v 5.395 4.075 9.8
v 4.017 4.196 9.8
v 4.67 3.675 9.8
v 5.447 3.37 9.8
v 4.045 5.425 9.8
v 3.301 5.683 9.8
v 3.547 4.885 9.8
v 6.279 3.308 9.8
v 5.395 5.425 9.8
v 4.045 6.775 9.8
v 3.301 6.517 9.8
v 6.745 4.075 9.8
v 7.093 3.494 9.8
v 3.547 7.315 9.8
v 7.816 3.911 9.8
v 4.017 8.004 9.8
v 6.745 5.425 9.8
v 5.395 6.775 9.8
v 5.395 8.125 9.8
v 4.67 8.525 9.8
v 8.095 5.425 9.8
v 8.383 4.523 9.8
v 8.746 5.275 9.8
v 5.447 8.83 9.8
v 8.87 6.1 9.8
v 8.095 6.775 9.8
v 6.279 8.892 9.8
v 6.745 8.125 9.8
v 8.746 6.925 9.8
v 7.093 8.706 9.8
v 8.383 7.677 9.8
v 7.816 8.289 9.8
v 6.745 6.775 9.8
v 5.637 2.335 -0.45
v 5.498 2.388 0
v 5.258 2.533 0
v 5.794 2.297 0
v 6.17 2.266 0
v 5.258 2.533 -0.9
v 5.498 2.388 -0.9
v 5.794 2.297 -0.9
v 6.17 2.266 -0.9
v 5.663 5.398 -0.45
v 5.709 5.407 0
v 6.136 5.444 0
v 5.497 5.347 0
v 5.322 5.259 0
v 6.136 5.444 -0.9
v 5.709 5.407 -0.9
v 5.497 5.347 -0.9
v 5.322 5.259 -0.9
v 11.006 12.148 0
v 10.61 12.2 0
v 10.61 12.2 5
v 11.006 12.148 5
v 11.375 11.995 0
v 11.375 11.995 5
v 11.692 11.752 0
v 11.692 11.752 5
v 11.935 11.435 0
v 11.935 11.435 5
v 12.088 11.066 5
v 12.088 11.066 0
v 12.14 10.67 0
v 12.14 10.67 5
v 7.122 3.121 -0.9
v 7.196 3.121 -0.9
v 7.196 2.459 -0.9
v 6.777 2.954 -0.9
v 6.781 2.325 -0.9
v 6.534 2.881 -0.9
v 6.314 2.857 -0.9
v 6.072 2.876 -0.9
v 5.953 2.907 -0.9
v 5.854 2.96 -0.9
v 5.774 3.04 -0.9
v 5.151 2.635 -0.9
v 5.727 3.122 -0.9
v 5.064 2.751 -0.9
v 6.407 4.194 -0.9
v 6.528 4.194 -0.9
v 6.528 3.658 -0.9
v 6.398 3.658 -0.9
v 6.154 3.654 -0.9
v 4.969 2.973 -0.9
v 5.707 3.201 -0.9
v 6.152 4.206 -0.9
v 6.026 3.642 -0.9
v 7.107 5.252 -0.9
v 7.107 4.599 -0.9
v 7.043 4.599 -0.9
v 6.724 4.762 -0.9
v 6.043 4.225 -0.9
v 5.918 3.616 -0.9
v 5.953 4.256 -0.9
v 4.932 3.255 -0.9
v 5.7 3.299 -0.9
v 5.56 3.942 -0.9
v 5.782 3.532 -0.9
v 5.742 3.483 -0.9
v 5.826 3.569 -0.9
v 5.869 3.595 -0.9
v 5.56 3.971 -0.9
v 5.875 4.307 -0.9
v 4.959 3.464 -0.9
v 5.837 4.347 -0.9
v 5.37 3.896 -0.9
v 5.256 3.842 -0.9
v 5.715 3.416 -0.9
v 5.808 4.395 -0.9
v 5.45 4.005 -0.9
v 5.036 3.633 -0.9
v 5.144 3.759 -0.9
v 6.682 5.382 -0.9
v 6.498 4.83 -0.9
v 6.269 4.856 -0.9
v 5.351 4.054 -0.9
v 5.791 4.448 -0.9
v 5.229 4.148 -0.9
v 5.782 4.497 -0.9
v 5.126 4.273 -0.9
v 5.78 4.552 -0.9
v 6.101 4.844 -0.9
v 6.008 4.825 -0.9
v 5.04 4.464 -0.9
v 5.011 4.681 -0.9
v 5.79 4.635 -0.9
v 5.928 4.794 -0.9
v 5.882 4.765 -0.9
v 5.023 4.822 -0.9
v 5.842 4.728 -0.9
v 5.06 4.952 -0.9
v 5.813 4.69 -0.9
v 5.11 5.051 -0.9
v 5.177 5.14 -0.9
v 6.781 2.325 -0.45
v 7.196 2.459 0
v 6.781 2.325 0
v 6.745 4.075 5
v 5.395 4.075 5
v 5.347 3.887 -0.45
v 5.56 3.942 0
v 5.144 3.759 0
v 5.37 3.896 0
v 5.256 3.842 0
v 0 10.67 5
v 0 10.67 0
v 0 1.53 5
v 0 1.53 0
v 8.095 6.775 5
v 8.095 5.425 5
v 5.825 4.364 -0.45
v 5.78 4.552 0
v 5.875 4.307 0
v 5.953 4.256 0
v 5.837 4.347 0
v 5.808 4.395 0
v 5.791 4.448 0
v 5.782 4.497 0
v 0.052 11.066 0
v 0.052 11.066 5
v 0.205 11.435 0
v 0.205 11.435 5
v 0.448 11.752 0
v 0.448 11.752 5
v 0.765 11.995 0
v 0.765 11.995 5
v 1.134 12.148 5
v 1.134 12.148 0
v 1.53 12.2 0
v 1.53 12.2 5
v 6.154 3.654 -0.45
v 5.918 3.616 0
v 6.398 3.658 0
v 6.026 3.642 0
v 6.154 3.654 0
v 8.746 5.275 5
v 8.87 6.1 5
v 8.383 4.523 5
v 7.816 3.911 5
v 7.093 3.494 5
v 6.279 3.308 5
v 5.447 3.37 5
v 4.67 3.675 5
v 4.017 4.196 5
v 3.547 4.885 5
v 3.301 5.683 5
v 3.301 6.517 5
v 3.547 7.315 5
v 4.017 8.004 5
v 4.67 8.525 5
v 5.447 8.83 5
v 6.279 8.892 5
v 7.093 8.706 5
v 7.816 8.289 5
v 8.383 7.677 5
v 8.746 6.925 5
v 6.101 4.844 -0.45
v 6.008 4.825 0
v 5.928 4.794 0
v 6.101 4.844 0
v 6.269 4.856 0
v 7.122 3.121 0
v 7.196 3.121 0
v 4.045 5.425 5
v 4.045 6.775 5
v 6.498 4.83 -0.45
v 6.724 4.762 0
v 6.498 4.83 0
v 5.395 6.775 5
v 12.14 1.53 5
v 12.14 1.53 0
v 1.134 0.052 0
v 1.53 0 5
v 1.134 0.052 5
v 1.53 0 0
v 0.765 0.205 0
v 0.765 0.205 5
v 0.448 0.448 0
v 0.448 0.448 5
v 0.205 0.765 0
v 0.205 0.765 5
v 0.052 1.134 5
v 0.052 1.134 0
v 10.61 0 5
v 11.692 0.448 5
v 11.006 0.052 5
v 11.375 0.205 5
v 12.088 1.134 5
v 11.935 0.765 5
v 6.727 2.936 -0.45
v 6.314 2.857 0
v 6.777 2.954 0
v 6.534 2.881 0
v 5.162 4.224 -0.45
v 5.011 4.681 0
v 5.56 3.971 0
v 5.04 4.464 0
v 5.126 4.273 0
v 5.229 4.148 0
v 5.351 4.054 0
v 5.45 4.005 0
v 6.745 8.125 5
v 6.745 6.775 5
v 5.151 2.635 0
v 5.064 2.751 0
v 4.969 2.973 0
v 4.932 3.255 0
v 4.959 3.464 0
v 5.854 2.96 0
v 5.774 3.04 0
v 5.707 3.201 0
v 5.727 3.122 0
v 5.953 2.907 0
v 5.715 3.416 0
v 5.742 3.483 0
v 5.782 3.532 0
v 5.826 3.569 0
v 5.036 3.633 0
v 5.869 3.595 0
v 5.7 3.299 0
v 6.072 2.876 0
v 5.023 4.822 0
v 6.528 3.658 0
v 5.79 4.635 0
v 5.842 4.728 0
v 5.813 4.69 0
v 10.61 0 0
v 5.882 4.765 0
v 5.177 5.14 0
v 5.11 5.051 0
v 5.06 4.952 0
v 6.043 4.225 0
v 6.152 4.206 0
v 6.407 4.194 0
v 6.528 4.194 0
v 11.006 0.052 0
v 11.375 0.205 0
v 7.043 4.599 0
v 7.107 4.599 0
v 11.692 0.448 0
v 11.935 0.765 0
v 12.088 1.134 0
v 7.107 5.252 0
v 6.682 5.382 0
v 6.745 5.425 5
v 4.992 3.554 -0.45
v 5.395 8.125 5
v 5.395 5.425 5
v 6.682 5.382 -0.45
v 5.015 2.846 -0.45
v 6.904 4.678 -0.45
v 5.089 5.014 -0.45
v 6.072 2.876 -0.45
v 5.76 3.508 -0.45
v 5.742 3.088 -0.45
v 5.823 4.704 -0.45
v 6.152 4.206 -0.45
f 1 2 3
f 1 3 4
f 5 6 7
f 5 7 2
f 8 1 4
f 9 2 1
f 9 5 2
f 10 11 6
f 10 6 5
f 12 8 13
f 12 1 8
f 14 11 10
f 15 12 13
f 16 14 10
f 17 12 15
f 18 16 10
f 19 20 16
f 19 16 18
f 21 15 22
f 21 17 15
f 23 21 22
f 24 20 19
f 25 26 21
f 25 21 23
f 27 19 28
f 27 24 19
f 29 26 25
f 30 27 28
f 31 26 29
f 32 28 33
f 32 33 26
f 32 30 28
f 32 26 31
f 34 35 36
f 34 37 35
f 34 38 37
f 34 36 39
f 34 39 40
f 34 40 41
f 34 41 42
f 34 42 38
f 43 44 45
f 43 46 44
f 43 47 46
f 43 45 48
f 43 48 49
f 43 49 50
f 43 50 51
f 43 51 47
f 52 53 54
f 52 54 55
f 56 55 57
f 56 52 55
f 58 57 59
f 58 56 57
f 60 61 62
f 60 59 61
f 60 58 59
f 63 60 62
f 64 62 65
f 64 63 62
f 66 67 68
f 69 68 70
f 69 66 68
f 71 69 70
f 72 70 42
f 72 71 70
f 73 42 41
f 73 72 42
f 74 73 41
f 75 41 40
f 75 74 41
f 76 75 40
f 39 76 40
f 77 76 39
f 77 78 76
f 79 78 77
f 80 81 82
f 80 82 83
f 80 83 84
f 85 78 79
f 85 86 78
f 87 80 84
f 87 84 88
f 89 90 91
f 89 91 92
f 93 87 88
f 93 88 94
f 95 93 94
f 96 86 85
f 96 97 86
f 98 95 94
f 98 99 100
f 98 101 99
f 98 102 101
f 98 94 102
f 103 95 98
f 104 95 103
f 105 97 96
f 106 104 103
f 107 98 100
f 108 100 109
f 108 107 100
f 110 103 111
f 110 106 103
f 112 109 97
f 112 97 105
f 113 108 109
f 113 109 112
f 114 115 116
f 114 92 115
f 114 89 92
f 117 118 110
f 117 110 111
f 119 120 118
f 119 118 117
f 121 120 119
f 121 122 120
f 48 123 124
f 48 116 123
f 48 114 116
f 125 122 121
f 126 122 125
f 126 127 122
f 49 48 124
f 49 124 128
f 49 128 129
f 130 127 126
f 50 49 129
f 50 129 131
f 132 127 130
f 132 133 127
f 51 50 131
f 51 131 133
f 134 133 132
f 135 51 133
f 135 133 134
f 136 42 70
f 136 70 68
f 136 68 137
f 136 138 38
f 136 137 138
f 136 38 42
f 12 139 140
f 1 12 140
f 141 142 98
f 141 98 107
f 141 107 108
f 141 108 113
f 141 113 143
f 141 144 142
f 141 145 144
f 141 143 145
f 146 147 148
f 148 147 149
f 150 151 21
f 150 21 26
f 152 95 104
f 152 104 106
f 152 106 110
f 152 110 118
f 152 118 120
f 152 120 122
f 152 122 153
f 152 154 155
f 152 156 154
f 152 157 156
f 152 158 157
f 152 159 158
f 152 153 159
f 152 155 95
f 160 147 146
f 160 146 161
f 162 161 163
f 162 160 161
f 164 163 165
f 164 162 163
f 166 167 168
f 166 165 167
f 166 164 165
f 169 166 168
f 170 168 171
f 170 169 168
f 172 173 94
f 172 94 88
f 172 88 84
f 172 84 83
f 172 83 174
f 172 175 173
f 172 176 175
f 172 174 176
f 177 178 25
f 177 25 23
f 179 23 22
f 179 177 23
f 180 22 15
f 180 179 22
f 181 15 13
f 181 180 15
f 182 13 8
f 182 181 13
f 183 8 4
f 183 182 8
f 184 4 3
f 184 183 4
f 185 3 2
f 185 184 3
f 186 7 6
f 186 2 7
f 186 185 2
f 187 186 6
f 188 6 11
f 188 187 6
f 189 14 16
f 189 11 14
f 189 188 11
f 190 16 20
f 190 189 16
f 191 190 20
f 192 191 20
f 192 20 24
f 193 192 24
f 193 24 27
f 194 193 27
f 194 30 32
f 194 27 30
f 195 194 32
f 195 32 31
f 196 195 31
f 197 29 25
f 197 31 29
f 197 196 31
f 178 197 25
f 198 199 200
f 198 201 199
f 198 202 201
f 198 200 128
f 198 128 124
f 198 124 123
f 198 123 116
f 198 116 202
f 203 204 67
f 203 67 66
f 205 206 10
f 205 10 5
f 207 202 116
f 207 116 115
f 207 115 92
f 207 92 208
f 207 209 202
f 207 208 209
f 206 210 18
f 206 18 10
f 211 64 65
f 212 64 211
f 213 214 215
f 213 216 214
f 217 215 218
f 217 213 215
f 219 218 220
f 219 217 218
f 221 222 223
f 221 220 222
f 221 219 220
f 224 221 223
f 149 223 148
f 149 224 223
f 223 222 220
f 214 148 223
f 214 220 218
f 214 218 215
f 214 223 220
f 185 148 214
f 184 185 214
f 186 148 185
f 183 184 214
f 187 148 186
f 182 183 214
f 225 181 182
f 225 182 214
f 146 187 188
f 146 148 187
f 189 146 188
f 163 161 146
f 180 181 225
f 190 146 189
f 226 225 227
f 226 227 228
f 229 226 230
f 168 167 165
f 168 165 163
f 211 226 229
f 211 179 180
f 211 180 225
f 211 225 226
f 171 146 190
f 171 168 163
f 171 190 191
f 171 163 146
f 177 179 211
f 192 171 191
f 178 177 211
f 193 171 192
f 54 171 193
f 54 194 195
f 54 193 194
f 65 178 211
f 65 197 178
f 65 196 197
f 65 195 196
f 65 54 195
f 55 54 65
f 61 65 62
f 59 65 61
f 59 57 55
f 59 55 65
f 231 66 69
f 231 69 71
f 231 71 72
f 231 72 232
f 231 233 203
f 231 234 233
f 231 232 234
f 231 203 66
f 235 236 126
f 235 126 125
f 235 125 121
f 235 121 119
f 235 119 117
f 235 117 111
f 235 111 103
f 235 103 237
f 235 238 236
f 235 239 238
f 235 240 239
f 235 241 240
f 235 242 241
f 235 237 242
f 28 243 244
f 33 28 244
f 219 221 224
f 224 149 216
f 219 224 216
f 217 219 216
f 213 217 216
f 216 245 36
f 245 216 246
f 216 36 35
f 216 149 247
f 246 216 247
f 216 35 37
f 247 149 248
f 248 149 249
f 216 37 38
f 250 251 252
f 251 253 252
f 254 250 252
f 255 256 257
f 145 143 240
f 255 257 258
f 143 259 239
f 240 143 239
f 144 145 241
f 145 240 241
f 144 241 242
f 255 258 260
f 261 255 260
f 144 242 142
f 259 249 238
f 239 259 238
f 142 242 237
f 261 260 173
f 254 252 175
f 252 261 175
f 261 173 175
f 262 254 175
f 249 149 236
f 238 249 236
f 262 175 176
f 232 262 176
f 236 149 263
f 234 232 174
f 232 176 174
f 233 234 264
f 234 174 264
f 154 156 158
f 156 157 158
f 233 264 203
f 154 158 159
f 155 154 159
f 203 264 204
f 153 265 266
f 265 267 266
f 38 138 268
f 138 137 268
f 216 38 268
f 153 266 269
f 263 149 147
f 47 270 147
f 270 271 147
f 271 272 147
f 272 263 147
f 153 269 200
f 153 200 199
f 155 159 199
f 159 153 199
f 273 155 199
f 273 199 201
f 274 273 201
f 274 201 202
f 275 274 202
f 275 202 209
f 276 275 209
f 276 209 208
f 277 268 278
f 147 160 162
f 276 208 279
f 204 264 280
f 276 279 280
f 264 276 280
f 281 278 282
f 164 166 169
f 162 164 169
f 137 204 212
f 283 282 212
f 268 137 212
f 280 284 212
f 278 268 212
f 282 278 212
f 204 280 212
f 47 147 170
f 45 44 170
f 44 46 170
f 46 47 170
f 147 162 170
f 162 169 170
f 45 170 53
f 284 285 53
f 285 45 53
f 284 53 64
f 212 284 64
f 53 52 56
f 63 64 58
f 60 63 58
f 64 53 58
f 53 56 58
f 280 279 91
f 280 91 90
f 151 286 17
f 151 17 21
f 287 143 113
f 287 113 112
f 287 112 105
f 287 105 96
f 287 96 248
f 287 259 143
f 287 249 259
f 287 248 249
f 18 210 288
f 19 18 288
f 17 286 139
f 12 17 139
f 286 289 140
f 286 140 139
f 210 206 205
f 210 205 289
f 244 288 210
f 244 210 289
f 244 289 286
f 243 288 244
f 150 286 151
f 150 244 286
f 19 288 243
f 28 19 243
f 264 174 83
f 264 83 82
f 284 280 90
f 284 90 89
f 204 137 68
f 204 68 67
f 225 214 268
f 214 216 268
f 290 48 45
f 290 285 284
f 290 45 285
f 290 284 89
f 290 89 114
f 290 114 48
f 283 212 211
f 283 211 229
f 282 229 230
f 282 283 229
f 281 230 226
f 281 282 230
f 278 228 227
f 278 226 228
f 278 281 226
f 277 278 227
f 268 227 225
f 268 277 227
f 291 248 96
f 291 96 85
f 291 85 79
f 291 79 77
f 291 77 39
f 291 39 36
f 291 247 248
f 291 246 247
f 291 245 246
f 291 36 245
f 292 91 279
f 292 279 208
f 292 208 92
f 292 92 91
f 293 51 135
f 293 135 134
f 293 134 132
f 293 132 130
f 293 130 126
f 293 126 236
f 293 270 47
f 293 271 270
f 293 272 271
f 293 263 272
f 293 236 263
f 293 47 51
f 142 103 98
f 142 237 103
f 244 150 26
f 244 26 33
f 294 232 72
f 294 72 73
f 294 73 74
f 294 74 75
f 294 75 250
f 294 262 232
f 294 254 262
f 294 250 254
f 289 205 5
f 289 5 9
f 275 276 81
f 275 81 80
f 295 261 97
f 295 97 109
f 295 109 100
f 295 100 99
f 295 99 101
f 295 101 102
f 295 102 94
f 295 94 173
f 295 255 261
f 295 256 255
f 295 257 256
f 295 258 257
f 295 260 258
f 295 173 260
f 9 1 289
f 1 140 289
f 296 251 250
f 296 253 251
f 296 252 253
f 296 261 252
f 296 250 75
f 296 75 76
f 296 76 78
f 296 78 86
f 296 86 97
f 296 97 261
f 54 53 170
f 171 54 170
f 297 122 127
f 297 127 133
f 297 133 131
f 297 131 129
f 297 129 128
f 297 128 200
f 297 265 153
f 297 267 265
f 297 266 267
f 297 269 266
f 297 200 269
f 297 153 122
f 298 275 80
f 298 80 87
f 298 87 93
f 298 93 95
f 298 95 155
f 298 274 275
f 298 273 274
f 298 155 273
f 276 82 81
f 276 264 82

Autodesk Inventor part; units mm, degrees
ref_plane "YZ Plane" through (0, 0, 0) normal (1, 0, 0) x (0, 1, 0)
ref_plane "XZ Plane" through (0, 0, 0) normal (0, 1, 0) x (-1, 0, 0)
sketch "Sketch1" plane through (0, 0, 0) normal (0, 0, 1) x (1, 0, 0)
  line L0 (14.6962, 12.74) -> (14.6962, 0) construction
  line L1 (10.61, 12.2) -> (1.53, 12.2)
  arc A0 (1.53, 12.2) -> (0, 10.67) centre (1.53, 10.67) ccw
  line L2 (0, 10.67) -> (0, 1.53)
  arc A1 (0, 1.53) -> (1.53, 0) centre (1.53, 1.53) ccw
  line L3 (1.53, 0) -> (10.61, 0)
  arc A2 (10.61, 0) -> (12.14, 1.53) centre (10.61, 1.53) ccw
  arc A3 (12.14, 10.67) -> (10.61, 12.2) centre (10.61, 10.67) ccw
  line L4 (12.14, 10.67) -> (12.14, 1.53)
  point P0 (0, 0)
  point P1 (0, 0)
  dimension "d10" = 12.74
ref_plane "Work Plane1" through (0, 0, 5) normal (0, 0, 1) x (1, 0, 0)
sketch "Sketch2" plane through (0, 0, 5) normal (0, 0, 1) x (1, 0, 0)
  line L0 (10.88, 12.74) -> (1.8, 12.74) projected
  line L1 (10.88, 12.74) -> (1.8, 12.74) projected
  arc A0 (1.8, 12.74) -> (0, 10.94) centre (1.8, 10.94) ccw projected
  line L2 (0, 10.94) -> (0, 1.8) projected
  arc A1 (0, 1.8) -> (1.8, 0) centre (1.8, 1.8) ccw projected
  line L3 (1.8, 0) -> (10.88, 0) projected
  arc A2 (10.88, 0) -> (12.68, 1.8) centre (10.88, 1.8) ccw projected
  line L4 (12.68, 1.8) -> (12.68, 10.94) projected
  arc A3 (12.68, 10.94) -> (10.88, 12.74) centre (10.88, 10.94) ccw projected
  circle A4 centre (6.34, 6.37) radius 2.8
  line L5 (5.665, 8.395) -> (7.015, 8.395)
  line L6 (7.015, 4.345) -> (5.665, 4.345)
  line L7 (5.665, 4.345) -> (7.015, 8.395) construction
  line L8 (5.665, 8.395) -> (7.015, 4.345) construction
  line L9 (8.365, 5.695) -> (8.365, 7.045)
  line L10 (4.315, 7.045) -> (4.315, 5.695)
  line L11 (4.315, 5.695) -> (8.365, 7.045) construction
  line L12 (8.365, 5.695) -> (4.315, 7.045) construction
  line L13 (4.315, 5.695) -> (5.665, 5.695)
  line L14 (7.015, 5.695) -> (8.365, 5.695)
  line L15 (5.665, 4.345) -> (5.665, 5.695)
  line L16 (5.665, 7.045) -> (5.665, 8.395)
  line L17 (8.365, 7.045) -> (7.015, 7.045)
  line L18 (5.665, 7.045) -> (4.315, 7.045)
  line L19 (7.015, 8.395) -> (7.015, 7.045)
  line L20 (7.015, 5.695) -> (7.015, 4.345)
  point P0 (0, 0)
  dimension "d3" = 5.6
  dimension "d4" = 4.05
  dimension "d5" = 1.35
  dimension "d6" = 4.05
  dimension "d7" = 1.35
extrude "Extrusion3" add sketch "Sketch1" along normal blind 5
sketch "Sketch3" plane through (0, 0, 5) normal (0, 0, 1) x (1, 0, 0)
  line L0 (10.61, 12.47) -> (1.53, 12.47)
  line L1 (10.61, 12.47) -> (1.53, 12.47)
  arc A0 (1.53, 12.47) -> (-0.27, 10.67) centre (1.53, 10.67) ccw
  line L2 (-0.27, 10.67) -> (-0.27, 1.53)
  arc A1 (-0.27, 1.53) -> (1.53, -0.27) centre (1.53, 1.53) ccw
  line L3 (1.53, -0.27) -> (10.61, -0.27)
  arc A2 (10.61, -0.27) -> (12.41, 1.53) centre (10.61, 1.53) ccw
  line L4 (12.41, 1.53) -> (12.41, 10.67)
  arc A3 (12.41, 10.67) -> (10.61, 12.47) centre (10.61, 10.67) ccw
  circle A4 centre (6.07, 6.1) radius 2.8
  line L5 (5.395, 8.125) -> (6.745, 8.125)
  line L6 (6.745, 4.075) -> (5.395, 4.075)
  line L7 (5.395, 4.075) -> (6.745, 8.125) construction
  line L8 (5.395, 8.125) -> (6.745, 4.075) construction
  line L9 (8.095, 5.425) -> (8.095, 6.775)
  line L10 (4.045, 6.775) -> (4.045, 5.425)
  line L11 (4.045, 5.425) -> (8.095, 6.775) construction
  line L12 (8.095, 5.425) -> (4.045, 6.775) construction
  line L13 (4.045, 5.425) -> (5.395, 5.425)
  line L14 (6.745, 5.425) -> (8.095, 5.425)
  line L15 (5.395, 4.075) -> (5.395, 5.425)
  line L16 (5.395, 6.775) -> (5.395, 8.125)
  line L17 (8.095, 6.775) -> (6.745, 6.775)
  line L18 (5.395, 6.775) -> (4.045, 6.775)
  line L19 (6.745, 8.125) -> (6.745, 6.775)
  line L20 (6.745, 5.425) -> (6.745, 4.075)
  line L21 (10.61, 12.2) -> (1.53, 12.2) projected
  line L22 (0, 10.67) -> (0, 1.53) projected
  point P0 (0, 0)
  point P1 (-0.27, -0.27)
  point P2 (6.07, 12.2)
  point P3 (0, 6.1)
  point P4 (6.07, 6.1)
  dimension "d14" = 5.6
  dimension "d15" = 4.05
  dimension "d16" = 1.35
  dimension "d17" = 4.05
  dimension "d18" = 1.35
extrude "Extrusion4" add sketch "Sketch3" along normal blind 4.8 contours A4
sketch "Sketch4" plane through (0, 0, 0) normal (0, 0, -1) x (-1, 0, 0)
  line L0 (-13.9436, 0) -> (-13.9436, 2.266)
  line L1 (-15.5559, 0) -> (-15.5559, 6.84)
  line L2 (-1.53, 0) -> (-10.61, 0) projected
  line L3 (-7.4059, 5.4445) -> (-4.7341, 5.4445) construction
  line L4 (-4.7341, 5.4445) -> (-4.7341, 2.266) construction
  line L5 (-4.7341, 2.266) -> (-7.4059, 2.266) construction
  line L6 (-7.4059, 2.266) -> (-7.4059, 5.4445) construction
  spline S0 degree 2 poles (-4.9318, 3.2547) (-4.9318, 3.0297) (-5.0974, 2.6615) (-5.2581, 2.5329) knots 0 0 0 1 2 2 2
  spline S1 degree 2 poles (-5.2581, 2.5329) (-5.4187, 2.4044) (-5.8562, 2.266) (-6.1701, 2.266) knots 0 0 0 1 2 2 2
  spline S2 degree 2 poles (-6.1701, 2.266) (-6.526, 2.266) (-7.0352, 2.3846) (-7.1958, 2.4588) knots 0 0 0 1 2 2 2
  line L7 (-7.1958, 2.4588) -> (-7.1958, 3.1212)
  line L8 (-7.1958, 3.1212) -> (-7.1217, 3.1212)
  spline S3 degree 2 poles (-7.1217, 3.1212) (-6.9536, 3.0149) (-6.5013, 2.8567) (-6.3135, 2.8567) knots 0 0 0 1 2 2 2
  spline S4 degree 2 poles (-6.3135, 2.8567) (-6.2022, 2.8567) (-5.9427, 2.8963) (-5.8537, 2.9605) knots 0 0 0 1 2 2 2
  spline S5 degree 2 poles (-5.8537, 2.9605) (-5.7845, 3.0124) (-5.7005, 3.1632) (-5.7005, 3.2991) knots 0 0 0 1 2 2 2
  spline S6 degree 2 poles (-5.7005, 3.2991) (-5.7005, 3.4351) (-5.8191, 3.5809) (-5.918, 3.6155) knots 0 0 0 1 2 2 2
  spline S7 degree 2 poles (-5.918, 3.6155) (-6.0169, 3.6501) (-6.2912, 3.6575) (-6.3975, 3.6575) knots 0 0 0 1 2 2 2
  line L9 (-6.3975, 3.6575) -> (-6.5285, 3.6575)
  line L10 (-6.5285, 3.6575) -> (-6.5285, 4.1939)
  line L11 (-6.5285, 4.1939) -> (-6.4074, 4.1939)
  spline S8 degree 2 poles (-6.4074, 4.1939) (-6.269, 4.1939) (-6.0342, 4.2186) (-5.9526, 4.2557) knots 0 0 0 1 2 2 2
  spline S9 degree 2 poles (-5.9526, 4.2557) (-5.871, 4.2952) (-5.7796, 4.4336) (-5.7796, 4.5523) knots 0 0 0 1 2 2 2
  spline S10 degree 2 poles (-5.7796, 4.5523) (-5.7796, 4.6462) (-5.8661, 4.7624) (-5.9279, 4.7945) knots 0 0 0 1 2 2 2
  spline S11 degree 2 poles (-5.9279, 4.7945) (-6.002, 4.8316) (-6.1998, 4.8563) (-6.269, 4.8563) knots 0 0 0 1 2 2 2
  spline S12 degree 2 poles (-6.269, 4.8563) (-6.3802, 4.8563) (-6.615, 4.8044) (-6.7237, 4.7624) knots 0 0 0 1 2 2 2
  spline S13 degree 2 poles (-6.7237, 4.7624) (-6.8103, 4.7302) (-6.9981, 4.6264) (-7.0426, 4.5992) knots 0 0 0 1 2 2 2
  line L12 (-7.0426, 4.5992) -> (-7.1069, 4.5992)
  line L13 (-7.1069, 4.5992) -> (-7.1069, 5.2517)
  spline S14 degree 2 poles (-7.1069, 5.2517) (-6.9487, 5.3185) (-6.4148, 5.4445) (-6.1355, 5.4445) knots 0 0 0 1 2 2 2
  spline S15 degree 2 poles (-6.1355, 5.4445) (-5.8636, 5.4445) (-5.4632, 5.3506) (-5.3223, 5.2592) knots 0 0 0 1 2 2 2
  spline S16 degree 2 poles (-5.3223, 5.2592) (-5.1666, 5.1628) (-5.0109, 4.8662) (-5.0109, 4.6808) knots 0 0 0 1 2 2 2
  spline S17 degree 2 poles (-5.0109, 4.6808) (-5.0109, 4.4188) (-5.3124, 4.0283) (-5.5596, 3.9714) knots 0 0 0 1 2 2 2
  line L14 (-5.5596, 3.9714) -> (-5.5596, 3.9418)
  spline S18 degree 2 poles (-5.5596, 3.9418) (-5.4509, 3.9269) (-5.2432, 3.8478) (-5.1444, 3.7589) knots 0 0 0 1 2 2 2
  spline S19 degree 2 poles (-5.1444, 3.7589) (-5.0529, 3.6798) (-4.9318, 3.4277) (-4.9318, 3.2547) knots 0 0 0 1 2 2 2
  point P0 (0, 0)
  point P1 (-6.07, 0)
  point P2 (-6.07, 2.266)
  point P3 (-6.07, 6.84)
  point P4 (-6.07, 2.266)
  dimension "d21" = 2.266
  dimension "d22" = 6.84
extrude "Extrusion5" add sketch "Sketch4" along normal blind 0.9
properties part number "IPC 3 key"
